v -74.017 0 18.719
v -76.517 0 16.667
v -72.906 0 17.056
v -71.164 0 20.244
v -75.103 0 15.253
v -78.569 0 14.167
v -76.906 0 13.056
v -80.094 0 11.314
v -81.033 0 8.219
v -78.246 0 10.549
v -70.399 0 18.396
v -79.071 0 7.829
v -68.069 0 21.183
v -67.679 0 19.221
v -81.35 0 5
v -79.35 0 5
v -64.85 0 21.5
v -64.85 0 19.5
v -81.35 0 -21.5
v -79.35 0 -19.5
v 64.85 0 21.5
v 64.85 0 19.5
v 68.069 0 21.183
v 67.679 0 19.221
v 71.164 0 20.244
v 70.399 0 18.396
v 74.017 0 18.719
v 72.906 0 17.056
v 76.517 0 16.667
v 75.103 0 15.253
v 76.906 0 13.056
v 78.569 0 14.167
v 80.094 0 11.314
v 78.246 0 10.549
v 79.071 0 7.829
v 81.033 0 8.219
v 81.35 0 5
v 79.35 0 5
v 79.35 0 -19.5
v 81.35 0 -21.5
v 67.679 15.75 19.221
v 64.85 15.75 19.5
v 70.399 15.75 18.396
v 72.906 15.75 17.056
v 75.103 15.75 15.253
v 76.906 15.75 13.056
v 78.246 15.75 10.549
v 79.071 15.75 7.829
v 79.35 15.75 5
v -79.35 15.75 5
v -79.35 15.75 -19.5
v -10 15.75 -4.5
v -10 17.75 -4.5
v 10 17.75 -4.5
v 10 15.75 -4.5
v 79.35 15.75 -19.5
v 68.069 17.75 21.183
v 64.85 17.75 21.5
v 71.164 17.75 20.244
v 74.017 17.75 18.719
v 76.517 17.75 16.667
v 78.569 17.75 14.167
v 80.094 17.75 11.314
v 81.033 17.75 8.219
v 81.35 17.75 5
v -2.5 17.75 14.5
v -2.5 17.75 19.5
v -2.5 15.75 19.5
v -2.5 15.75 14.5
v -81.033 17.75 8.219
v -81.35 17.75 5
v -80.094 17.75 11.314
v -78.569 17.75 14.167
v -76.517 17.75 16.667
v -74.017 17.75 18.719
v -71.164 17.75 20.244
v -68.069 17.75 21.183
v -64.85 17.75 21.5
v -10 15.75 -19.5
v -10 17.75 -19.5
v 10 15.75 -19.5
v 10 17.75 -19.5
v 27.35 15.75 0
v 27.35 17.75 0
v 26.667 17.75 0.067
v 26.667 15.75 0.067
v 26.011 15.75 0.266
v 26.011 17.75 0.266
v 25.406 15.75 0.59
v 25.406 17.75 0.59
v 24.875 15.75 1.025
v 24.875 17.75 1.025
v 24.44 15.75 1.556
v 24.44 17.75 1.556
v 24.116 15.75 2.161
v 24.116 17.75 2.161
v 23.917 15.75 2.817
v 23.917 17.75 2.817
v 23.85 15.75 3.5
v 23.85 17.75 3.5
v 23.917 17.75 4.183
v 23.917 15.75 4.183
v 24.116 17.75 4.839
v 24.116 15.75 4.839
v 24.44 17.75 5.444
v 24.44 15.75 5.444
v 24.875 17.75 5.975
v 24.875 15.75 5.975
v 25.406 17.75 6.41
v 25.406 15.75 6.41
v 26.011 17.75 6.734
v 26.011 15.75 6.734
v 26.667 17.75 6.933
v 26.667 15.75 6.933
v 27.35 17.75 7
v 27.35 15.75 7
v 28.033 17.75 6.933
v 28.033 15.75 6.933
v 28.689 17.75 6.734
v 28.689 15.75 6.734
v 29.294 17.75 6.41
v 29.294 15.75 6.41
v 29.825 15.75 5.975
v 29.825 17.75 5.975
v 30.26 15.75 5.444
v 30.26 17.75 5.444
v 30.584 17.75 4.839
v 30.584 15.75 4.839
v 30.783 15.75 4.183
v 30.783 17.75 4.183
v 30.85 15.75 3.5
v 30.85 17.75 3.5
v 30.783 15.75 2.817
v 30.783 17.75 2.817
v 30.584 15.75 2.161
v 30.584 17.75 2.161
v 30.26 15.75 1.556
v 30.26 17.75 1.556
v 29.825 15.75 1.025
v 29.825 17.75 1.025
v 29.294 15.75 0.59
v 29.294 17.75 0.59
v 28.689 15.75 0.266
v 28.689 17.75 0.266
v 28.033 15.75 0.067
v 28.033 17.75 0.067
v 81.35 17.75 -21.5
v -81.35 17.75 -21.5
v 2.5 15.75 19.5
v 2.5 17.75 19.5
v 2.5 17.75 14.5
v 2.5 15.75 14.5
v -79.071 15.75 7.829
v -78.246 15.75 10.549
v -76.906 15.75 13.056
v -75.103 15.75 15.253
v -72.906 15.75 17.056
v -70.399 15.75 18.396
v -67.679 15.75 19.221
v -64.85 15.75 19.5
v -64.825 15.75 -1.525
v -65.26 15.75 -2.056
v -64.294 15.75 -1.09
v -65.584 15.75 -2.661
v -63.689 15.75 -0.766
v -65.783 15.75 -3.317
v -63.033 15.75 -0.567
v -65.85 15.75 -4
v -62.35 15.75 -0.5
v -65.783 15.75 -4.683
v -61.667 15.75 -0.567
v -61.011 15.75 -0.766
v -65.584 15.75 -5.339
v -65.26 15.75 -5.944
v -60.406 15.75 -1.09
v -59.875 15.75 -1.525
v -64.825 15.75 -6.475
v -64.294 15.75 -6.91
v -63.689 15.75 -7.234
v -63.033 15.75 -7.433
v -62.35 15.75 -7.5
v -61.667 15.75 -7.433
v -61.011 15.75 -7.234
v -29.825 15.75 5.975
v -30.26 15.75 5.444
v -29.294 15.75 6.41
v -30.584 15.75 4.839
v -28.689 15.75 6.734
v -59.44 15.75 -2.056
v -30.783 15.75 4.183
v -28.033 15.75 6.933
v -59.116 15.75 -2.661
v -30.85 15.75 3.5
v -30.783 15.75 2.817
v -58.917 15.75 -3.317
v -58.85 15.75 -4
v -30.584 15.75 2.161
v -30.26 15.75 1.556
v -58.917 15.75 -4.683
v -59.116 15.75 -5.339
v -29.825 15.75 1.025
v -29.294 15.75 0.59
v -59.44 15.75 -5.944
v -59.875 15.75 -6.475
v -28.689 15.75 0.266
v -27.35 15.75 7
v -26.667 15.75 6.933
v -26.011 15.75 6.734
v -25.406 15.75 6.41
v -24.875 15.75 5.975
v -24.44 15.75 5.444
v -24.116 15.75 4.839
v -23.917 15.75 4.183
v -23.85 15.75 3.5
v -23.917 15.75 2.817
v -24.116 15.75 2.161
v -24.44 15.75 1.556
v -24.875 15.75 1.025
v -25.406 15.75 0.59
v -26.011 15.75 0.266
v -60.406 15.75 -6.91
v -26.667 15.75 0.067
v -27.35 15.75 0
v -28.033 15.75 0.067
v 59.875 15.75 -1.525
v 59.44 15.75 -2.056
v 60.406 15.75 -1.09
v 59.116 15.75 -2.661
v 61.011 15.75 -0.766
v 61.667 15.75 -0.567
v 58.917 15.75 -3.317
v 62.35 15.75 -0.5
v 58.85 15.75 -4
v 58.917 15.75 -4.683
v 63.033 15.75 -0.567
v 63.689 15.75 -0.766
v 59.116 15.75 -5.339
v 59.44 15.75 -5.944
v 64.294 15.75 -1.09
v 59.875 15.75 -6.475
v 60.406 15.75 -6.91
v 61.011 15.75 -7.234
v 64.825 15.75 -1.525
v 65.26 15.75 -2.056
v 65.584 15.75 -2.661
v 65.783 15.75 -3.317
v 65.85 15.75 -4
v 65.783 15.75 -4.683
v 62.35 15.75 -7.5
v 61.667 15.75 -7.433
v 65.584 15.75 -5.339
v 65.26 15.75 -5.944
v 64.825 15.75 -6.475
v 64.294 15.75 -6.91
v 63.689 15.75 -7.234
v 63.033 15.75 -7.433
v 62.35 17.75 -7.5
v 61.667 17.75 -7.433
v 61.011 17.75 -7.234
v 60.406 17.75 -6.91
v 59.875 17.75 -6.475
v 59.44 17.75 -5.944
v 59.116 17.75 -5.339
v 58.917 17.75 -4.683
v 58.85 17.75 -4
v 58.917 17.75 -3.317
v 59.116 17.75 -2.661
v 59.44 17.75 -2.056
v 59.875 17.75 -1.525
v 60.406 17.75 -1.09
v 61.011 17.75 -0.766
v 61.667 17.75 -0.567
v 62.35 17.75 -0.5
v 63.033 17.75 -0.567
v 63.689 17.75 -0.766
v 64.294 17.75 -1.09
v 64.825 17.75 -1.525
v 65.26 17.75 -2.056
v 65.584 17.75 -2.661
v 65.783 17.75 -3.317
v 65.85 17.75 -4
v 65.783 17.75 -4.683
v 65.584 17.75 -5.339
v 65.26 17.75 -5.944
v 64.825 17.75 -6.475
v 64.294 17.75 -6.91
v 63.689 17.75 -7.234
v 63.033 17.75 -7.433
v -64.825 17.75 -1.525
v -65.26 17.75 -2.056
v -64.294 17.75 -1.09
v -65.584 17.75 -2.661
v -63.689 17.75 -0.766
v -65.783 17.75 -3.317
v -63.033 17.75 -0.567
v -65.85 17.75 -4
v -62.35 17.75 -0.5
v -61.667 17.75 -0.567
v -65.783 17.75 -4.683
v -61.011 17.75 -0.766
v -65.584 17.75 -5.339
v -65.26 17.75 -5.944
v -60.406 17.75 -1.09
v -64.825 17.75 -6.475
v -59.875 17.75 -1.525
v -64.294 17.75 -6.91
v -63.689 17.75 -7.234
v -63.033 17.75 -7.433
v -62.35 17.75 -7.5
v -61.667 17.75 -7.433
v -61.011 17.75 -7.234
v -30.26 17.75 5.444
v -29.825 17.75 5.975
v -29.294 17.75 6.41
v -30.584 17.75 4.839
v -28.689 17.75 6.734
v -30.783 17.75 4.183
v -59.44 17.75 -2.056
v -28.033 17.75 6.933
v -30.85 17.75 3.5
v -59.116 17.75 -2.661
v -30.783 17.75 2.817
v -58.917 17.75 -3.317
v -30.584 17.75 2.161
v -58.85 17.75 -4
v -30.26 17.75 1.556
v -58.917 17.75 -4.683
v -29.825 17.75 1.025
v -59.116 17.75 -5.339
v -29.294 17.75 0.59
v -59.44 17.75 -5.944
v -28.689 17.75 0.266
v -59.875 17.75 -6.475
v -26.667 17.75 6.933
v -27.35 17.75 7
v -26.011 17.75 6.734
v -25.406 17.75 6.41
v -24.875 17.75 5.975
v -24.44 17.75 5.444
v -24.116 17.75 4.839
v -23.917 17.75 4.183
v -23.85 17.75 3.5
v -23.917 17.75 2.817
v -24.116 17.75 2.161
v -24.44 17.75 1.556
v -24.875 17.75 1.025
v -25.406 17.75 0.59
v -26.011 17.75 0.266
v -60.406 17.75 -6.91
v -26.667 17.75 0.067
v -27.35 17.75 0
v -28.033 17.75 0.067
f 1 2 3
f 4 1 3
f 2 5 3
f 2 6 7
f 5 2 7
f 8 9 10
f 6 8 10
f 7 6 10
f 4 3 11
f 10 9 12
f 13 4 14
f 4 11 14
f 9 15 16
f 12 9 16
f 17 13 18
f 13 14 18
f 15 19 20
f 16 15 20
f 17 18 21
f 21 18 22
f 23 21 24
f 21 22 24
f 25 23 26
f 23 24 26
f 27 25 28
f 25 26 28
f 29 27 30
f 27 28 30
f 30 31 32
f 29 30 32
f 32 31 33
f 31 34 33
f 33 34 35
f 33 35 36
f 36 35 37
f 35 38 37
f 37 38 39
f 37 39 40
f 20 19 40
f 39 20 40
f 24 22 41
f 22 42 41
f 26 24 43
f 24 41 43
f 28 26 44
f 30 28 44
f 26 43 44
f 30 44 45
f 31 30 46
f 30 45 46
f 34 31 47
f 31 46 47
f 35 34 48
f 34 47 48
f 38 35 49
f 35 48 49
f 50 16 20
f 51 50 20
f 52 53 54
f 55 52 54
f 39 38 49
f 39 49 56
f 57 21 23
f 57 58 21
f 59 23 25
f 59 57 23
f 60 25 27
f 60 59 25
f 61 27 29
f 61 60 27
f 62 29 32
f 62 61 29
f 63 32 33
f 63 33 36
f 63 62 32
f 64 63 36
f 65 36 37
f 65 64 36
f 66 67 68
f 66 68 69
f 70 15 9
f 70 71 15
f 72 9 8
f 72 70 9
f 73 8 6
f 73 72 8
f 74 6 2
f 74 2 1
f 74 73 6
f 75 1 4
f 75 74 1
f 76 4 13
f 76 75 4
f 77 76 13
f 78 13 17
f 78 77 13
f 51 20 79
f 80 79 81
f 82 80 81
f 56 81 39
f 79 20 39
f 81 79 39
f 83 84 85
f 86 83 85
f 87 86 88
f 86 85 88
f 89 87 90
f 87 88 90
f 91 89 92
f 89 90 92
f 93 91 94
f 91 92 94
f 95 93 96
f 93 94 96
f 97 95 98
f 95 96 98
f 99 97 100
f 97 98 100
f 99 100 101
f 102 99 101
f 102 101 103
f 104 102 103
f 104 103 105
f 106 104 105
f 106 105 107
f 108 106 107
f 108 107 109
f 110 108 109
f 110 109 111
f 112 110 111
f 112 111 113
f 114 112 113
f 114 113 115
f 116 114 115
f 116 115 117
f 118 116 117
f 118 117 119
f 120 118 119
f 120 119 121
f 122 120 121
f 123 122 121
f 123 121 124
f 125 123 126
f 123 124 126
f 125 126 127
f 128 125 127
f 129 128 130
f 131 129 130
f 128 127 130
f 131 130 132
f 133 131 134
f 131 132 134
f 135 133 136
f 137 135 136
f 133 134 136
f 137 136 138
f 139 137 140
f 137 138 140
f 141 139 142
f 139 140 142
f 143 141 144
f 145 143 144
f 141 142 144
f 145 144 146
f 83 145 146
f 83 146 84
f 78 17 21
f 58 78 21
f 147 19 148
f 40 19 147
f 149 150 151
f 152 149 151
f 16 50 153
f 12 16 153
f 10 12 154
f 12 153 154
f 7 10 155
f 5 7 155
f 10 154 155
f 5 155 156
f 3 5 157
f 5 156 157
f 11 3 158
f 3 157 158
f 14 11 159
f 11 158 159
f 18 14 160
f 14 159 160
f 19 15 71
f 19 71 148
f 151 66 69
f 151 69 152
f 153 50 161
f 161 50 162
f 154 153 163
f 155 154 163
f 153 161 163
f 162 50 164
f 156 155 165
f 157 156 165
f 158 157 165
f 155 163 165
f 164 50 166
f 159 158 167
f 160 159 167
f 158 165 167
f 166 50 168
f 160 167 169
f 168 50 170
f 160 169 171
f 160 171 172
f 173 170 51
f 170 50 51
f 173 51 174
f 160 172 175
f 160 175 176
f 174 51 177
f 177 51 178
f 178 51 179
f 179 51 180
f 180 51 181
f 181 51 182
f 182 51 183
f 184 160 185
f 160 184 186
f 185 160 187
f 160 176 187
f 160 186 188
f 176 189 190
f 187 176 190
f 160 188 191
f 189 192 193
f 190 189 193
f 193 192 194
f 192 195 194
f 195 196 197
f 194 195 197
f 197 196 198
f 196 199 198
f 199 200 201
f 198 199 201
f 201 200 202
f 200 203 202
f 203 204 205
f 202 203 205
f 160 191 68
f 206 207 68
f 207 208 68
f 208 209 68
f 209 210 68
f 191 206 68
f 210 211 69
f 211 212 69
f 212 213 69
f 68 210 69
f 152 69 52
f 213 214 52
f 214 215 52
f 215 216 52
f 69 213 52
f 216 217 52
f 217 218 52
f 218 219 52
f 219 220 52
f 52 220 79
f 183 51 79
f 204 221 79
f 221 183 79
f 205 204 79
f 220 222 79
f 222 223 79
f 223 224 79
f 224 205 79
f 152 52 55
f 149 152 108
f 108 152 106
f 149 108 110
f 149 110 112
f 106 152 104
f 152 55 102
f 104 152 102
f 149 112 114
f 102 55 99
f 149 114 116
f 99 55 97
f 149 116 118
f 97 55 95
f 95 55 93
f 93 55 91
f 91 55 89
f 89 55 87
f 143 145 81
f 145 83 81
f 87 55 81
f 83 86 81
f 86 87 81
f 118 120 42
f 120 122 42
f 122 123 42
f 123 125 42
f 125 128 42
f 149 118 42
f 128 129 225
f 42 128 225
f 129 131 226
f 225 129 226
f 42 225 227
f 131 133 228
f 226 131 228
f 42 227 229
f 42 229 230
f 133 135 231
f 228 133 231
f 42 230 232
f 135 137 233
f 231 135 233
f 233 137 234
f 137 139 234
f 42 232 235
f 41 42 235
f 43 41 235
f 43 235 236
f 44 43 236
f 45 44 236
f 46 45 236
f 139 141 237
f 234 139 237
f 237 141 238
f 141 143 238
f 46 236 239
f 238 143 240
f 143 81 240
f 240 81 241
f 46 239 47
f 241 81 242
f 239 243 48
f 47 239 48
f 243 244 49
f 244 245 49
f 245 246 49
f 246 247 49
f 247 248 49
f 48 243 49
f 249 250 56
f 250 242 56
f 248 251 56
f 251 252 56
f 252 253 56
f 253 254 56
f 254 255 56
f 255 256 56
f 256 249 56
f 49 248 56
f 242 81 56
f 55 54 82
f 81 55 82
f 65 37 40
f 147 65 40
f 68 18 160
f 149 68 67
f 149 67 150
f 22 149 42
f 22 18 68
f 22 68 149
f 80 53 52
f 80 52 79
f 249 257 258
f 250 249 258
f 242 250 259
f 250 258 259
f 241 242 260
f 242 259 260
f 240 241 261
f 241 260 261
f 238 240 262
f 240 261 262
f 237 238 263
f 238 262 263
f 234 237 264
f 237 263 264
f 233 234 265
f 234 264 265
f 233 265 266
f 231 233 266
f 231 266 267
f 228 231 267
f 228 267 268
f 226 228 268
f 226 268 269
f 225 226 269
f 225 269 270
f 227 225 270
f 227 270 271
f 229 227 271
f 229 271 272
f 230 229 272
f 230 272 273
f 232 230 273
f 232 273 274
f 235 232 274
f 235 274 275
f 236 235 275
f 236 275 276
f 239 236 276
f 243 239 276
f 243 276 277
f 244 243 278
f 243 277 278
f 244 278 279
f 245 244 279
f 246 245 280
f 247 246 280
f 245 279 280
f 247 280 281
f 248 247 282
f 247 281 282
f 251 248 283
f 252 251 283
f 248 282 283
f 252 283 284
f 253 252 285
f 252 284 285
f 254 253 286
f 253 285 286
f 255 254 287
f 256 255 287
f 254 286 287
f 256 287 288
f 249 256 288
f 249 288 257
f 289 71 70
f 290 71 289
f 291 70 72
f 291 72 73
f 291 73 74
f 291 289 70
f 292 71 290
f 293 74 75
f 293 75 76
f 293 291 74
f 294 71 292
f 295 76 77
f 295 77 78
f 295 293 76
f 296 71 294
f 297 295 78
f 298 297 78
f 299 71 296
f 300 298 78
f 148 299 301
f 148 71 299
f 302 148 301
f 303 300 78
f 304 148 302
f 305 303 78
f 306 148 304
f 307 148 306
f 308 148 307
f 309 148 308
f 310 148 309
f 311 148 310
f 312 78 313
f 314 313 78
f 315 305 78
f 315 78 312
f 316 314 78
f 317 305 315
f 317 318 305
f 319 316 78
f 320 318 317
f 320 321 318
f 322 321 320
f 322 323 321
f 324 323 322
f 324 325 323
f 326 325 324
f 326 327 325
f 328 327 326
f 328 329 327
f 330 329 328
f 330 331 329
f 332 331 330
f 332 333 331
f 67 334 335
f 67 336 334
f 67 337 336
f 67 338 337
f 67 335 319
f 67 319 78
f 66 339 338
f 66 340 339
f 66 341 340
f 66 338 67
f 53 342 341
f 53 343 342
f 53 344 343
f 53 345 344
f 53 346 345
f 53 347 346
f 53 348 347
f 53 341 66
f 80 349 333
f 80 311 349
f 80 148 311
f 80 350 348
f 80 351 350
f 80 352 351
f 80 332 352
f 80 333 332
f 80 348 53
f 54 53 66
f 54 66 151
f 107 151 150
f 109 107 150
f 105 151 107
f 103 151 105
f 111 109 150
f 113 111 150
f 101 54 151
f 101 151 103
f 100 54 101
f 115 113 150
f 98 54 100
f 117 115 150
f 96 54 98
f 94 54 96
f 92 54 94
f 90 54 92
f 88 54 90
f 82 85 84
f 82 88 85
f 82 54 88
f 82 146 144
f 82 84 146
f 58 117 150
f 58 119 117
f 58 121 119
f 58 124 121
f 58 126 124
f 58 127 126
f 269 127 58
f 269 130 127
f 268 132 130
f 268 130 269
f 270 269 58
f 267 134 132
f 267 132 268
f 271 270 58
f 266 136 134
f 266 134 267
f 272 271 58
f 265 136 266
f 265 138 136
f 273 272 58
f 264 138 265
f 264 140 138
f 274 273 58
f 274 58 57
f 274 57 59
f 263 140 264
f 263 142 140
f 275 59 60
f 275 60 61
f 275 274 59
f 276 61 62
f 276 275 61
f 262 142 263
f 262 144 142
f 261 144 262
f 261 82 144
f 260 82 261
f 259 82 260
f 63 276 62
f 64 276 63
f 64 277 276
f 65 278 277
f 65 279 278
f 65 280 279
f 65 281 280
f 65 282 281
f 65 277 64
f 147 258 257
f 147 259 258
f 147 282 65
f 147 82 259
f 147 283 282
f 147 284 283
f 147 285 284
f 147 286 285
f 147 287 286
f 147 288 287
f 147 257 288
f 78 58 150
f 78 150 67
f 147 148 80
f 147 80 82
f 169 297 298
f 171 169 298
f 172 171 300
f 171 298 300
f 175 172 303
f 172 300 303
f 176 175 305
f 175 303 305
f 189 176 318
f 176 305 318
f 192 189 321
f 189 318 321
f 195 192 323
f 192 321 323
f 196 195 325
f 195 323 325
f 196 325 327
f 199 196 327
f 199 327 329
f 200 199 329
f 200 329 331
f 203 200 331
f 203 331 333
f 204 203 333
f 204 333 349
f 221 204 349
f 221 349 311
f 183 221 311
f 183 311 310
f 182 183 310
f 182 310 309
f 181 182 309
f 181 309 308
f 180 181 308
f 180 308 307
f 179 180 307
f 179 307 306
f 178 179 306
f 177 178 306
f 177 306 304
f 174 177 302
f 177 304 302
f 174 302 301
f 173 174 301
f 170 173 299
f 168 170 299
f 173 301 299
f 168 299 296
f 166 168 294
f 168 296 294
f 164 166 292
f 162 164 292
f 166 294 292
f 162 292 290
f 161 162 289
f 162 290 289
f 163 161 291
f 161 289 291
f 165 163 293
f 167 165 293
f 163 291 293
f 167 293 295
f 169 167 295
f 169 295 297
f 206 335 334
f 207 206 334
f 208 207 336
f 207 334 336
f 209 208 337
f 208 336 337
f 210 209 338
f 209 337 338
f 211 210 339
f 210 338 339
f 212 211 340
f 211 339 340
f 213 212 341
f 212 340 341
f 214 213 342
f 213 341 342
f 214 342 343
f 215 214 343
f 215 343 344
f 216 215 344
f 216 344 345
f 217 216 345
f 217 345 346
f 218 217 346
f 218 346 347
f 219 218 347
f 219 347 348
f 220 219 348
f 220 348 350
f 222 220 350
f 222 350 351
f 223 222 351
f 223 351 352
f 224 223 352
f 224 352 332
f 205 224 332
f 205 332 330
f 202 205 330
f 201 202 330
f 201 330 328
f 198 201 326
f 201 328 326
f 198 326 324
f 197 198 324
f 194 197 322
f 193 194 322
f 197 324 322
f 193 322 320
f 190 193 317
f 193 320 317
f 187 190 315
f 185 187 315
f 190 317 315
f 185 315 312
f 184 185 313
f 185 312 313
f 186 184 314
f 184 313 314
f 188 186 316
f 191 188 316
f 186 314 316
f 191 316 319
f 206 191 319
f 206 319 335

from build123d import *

# Parameters (mm, degrees)
SKETCH1_W           = 162.7
SKETCH1_H           = 43
BOSS_EXTRUDE2_DEPTH = 17.75
FILLET2_R           = 16.5
SHELL1_T            = -2
SKETCH2_R           = 3.5
CUT_EXTRUDE1_DEPTH  = 86.994970783
SKETCH5_W           = 20
SKETCH5_H           = 15
CUT_EXTRUDE2_DEPTH  = 86.994970783
SKETCH6_W           = 5
SKETCH6_H           = 5
CUT_EXTRUDE3_DEPTH  = 86.994970783


with BuildPart() as part:
    # Sketch1 → Boss-Extrude2 (new body)
    with BuildSketch(Plane(origin=(0, 0, 0), x_dir=(1, 0, 0), z_dir=(0, 1, 0))):
        Rectangle(SKETCH1_W, SKETCH1_H)
    extrude(amount=BOSS_EXTRUDE2_DEPTH)

    # Fillet2
    fillet2_edges = [part.edges().sort_by_distance(p)[0] for p in [
        (81.35, 8.875, 21.5),
        (-81.35, 8.875, 21.5),
    ]]
    fillet(fillet2_edges, radius=FILLET2_R)

    # Shell1
    shell1_openings = [part.faces().sort_by_distance(p)[0] for p in [
        (0, 0, -0.302595299),
    ]]
    offset(amount=SHELL1_T, openings=shell1_openings, kind=Kind.INTERSECTION)

    # Sketch2 → Cut-Extrude1 (cut, through all)
    with BuildSketch(Plane(origin=(0, 17.75, 0), x_dir=(1, 0, 0), z_dir=(0, 1, 0))):
        with Locations(Location((-62.35, 4, 0), (0, 0, 270))):
            Circle(SKETCH2_R)
        with Locations(Location((-27.35, -3.5, 0), (0, 0, 270))):
            Circle(SKETCH2_R)
        with Locations(Location((27.35, -3.5, 0), (0, 0, 90))):
            Circle(SKETCH2_R)
        with Locations(Location((62.35, 4, 0), (0, 0, 90))):
            Circle(SKETCH2_R)
    extrude(amount=-CUT_EXTRUDE1_DEPTH, mode=Mode.SUBTRACT)

    # Sketch5 → Cut-Extrude2 (cut, through all)
    with BuildSketch(Plane(origin=(0, 17.75, 0), x_dir=(1, 0, 0), z_dir=(0, 1, 0))):
        with Locations((0, 12)):
            Rectangle(SKETCH5_W, SKETCH5_H)
    extrude(amount=-CUT_EXTRUDE2_DEPTH, mode=Mode.SUBTRACT)

    # Sketch6 → Cut-Extrude3 (cut, through all)
    with BuildSketch(Plane(origin=(0, 17.75, 0), x_dir=(1, 0, 0), z_dir=(0, 1, 0))):
        with Locations((0, -17)):
            Rectangle(SKETCH6_W, SKETCH6_H)
    extrude(amount=-CUT_EXTRUDE3_DEPTH, mode=Mode.SUBTRACT)


solid = part.part
